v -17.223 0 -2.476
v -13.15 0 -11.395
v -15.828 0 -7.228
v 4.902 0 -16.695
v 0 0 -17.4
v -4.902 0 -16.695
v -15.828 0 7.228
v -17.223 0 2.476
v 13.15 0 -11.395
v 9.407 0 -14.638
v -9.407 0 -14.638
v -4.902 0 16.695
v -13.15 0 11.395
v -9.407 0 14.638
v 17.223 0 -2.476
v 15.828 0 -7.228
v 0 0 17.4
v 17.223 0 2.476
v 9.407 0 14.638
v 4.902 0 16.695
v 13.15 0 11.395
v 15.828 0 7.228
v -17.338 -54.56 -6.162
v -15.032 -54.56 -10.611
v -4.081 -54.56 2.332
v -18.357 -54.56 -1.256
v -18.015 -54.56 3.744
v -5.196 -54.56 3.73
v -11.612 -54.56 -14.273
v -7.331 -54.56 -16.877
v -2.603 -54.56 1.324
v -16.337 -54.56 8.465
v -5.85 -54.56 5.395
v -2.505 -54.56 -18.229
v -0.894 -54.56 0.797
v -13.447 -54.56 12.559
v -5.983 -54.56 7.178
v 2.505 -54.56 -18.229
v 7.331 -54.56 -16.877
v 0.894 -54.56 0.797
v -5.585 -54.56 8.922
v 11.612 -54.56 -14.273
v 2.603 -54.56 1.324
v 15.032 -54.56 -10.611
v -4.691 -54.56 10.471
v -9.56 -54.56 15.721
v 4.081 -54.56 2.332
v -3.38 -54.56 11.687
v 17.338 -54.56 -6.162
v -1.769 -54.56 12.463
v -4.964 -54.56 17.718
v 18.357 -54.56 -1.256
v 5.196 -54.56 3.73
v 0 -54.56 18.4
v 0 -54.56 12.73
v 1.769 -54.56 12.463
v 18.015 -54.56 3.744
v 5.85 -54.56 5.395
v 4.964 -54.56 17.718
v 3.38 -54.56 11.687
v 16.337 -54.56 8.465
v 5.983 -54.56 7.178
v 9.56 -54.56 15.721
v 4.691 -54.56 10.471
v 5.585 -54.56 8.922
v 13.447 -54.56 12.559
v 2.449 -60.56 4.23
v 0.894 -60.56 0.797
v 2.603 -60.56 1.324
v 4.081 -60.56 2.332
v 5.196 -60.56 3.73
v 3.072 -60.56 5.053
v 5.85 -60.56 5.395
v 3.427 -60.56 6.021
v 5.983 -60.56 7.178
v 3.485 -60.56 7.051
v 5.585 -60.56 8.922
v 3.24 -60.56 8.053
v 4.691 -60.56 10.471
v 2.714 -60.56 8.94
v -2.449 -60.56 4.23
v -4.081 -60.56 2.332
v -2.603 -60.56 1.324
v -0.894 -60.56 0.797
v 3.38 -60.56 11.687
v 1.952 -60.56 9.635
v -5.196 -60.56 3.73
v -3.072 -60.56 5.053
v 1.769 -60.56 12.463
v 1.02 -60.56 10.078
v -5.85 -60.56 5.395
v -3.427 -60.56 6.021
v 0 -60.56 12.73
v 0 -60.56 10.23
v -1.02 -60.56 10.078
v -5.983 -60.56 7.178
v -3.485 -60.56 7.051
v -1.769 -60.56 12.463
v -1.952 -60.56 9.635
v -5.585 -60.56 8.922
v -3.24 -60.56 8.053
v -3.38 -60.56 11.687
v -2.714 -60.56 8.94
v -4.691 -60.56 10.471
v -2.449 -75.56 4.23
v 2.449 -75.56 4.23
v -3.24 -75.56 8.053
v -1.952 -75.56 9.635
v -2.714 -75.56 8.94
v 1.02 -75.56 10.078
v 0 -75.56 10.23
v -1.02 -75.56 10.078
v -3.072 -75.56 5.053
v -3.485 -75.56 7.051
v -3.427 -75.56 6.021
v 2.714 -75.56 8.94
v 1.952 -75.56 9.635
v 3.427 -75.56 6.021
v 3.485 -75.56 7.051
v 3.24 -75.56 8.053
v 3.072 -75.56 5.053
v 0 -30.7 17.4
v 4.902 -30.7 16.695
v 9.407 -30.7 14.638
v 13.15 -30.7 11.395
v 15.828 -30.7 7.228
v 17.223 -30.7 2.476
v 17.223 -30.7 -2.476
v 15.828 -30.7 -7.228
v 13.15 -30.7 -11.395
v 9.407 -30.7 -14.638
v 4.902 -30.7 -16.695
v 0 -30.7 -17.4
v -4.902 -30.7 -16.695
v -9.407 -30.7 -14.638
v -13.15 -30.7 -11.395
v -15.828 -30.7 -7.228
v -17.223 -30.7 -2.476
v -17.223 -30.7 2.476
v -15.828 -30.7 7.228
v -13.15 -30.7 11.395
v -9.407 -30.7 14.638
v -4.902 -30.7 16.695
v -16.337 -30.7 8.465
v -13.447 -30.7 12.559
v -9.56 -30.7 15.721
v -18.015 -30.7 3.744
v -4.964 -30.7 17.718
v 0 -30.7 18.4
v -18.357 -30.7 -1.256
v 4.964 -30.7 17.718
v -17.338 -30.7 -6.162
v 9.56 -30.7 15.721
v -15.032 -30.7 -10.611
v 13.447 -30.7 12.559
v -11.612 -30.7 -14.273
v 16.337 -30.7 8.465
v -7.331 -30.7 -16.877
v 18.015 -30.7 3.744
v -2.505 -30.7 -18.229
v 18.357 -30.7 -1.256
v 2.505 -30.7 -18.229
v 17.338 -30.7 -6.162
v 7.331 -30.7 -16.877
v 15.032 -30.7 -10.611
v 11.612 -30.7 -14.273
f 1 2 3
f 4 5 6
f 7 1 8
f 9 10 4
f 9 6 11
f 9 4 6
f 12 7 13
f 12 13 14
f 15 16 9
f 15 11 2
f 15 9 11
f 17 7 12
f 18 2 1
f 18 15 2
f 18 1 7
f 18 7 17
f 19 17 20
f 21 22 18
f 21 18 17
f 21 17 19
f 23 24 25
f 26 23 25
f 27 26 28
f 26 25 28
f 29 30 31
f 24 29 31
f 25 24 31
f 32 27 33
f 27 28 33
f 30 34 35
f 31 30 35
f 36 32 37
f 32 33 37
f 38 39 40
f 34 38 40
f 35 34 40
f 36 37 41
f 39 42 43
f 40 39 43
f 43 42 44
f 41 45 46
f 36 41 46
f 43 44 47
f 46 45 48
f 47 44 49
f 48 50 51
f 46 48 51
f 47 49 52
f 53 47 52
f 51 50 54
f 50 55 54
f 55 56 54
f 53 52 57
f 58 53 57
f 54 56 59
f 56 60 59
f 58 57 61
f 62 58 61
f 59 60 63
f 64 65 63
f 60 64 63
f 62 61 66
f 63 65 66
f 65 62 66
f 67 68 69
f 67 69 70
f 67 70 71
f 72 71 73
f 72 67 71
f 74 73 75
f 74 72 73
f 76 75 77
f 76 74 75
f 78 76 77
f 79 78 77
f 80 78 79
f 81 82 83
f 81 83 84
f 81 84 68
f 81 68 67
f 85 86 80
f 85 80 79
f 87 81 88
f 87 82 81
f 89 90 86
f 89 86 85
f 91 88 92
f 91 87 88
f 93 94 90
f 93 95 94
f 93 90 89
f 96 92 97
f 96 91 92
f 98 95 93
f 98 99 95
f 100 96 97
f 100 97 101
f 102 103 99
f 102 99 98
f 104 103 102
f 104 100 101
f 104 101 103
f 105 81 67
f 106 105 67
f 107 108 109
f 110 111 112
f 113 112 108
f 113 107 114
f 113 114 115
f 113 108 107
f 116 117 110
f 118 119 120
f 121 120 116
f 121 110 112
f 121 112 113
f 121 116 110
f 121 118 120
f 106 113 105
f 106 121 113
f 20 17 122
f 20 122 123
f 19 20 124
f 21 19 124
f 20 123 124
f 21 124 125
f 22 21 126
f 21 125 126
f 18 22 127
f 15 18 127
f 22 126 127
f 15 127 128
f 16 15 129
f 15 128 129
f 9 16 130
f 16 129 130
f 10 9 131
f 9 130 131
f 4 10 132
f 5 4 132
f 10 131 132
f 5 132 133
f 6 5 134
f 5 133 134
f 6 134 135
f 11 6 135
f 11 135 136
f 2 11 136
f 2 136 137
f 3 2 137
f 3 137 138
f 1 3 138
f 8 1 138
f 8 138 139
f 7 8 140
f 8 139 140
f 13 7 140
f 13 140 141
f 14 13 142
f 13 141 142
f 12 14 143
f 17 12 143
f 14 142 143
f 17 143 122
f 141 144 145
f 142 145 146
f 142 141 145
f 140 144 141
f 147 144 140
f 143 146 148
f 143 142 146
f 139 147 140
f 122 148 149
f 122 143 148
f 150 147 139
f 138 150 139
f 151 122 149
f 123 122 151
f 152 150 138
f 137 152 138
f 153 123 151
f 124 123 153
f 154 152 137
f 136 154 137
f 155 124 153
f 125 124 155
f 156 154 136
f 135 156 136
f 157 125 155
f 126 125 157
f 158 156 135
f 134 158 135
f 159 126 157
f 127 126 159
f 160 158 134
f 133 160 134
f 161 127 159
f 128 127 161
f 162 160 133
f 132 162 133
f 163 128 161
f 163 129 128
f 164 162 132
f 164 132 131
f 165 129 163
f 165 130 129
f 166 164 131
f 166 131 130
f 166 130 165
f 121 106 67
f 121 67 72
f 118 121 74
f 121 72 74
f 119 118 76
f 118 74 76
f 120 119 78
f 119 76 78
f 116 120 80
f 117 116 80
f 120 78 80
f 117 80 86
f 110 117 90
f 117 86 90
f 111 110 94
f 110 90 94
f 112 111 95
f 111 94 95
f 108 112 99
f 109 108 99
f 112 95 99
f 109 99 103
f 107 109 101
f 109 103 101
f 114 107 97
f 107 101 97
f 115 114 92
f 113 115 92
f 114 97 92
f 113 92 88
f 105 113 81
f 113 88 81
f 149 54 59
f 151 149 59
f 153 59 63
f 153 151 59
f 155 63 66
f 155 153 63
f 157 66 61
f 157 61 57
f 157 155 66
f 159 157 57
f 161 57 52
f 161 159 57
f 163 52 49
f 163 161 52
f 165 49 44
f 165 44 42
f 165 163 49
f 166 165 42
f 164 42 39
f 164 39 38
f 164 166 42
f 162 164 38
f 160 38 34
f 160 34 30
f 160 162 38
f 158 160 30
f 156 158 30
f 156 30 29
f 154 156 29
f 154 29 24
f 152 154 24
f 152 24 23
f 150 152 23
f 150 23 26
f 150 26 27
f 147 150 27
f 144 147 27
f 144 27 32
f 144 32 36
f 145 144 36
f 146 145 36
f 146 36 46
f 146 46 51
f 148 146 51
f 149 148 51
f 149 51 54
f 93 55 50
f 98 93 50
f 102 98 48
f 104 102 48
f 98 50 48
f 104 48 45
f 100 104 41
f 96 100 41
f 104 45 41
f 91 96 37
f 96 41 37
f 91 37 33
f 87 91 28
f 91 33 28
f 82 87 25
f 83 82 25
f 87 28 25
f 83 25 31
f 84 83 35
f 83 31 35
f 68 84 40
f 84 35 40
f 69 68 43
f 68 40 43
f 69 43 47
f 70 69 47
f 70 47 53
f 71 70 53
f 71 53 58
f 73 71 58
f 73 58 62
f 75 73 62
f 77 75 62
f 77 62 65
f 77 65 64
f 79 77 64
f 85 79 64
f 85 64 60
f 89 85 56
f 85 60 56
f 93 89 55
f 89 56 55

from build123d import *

# Parameters (mm, degrees)
CROQUIS1_R              = 18.4
SALIENTE_EXTRUIR1_DEPTH = 54.56
CROQUIS2_R              = 6
SALIENTE_EXTRUIR2_DEPTH = 6
CROQUIS3_R              = 3.5
SALIENTE_EXTRUIR3_DEPTH = 15
CORTAR_EXTRUIR1_START   = -15
CORTAR_EXTRUIR1_DEPTH   = 15
CROQUIS6_R              = 18.42847038
CORTAR_EXTRUIR2_DEPTH   = 30.7
CROQUIS7_R              = 17.4
SALIENTE_EXTRUIR5_DEPTH = 30.7


with BuildPart() as part:
    # Croquis1 → Saliente-Extruir1 (new body)
    with BuildSketch(Plane(origin=(0, 0, 0), x_dir=(1, 0, 0), z_dir=(0, 1, 0))):
        with Locations(Location((0, 0, 0), (0, 0, 270))):
            Circle(CROQUIS1_R)
    extrude(amount=-SALIENTE_EXTRUIR1_DEPTH)

    # Croquis2 → Saliente-Extruir2 (add)
    with BuildSketch(Plane.XZ.offset(54.56)):
        with Locations(Location((0, 6.73, 0), (0, 0, 90))):
            Circle(CROQUIS2_R)
    extrude(amount=SALIENTE_EXTRUIR2_DEPTH)

    # Croquis3 → Saliente-Extruir3 (add)
    with BuildSketch(Plane.XZ.offset(60.56)):
        with Locations(Location((0, 6.73, 0), (0, 0, 270))):
            Circle(CROQUIS3_R)
    extrude(amount=SALIENTE_EXTRUIR3_DEPTH)

    # Croquis4 → Cortar-Extruir1 (cut)
    with BuildSketch(Plane(origin=(0, -75.56, 0), x_dir=(-1, 0, 0), z_dir=(0, -1, 0)).offset(CORTAR_EXTRUIR1_START)):
        with BuildLine():
            Line((2.449489743, -4.23), (-2.449489743, -4.23))
            ThreePointArc((-2.449489743, -4.23), (0, -3.23), (2.449489743, -4.23))
        make_face()
    extrude(amount=CORTAR_EXTRUIR1_DEPTH, mode=Mode.SUBTRACT)

    # Croquis6 → Cortar-Extruir2 (cut)
    with BuildSketch(Plane(origin=(0, 0, 0), x_dir=(1, 0, 0), z_dir=(0, 1, 0))):
        Circle(CROQUIS6_R)
    extrude(amount=-CORTAR_EXTRUIR2_DEPTH, mode=Mode.SUBTRACT)

    # Croquis7 → Saliente-Extruir5 (add)
    with BuildSketch(Plane(origin=(0, -30.7, 0), x_dir=(1, 0, 0), z_dir=(0, 1, 0))):
        with Locations(Location((0, 0, 0), (0, 0, 270))):
            Circle(CROQUIS7_R)
    extrude(amount=SALIENTE_EXTRUIR5_DEPTH)


solid = part.part
